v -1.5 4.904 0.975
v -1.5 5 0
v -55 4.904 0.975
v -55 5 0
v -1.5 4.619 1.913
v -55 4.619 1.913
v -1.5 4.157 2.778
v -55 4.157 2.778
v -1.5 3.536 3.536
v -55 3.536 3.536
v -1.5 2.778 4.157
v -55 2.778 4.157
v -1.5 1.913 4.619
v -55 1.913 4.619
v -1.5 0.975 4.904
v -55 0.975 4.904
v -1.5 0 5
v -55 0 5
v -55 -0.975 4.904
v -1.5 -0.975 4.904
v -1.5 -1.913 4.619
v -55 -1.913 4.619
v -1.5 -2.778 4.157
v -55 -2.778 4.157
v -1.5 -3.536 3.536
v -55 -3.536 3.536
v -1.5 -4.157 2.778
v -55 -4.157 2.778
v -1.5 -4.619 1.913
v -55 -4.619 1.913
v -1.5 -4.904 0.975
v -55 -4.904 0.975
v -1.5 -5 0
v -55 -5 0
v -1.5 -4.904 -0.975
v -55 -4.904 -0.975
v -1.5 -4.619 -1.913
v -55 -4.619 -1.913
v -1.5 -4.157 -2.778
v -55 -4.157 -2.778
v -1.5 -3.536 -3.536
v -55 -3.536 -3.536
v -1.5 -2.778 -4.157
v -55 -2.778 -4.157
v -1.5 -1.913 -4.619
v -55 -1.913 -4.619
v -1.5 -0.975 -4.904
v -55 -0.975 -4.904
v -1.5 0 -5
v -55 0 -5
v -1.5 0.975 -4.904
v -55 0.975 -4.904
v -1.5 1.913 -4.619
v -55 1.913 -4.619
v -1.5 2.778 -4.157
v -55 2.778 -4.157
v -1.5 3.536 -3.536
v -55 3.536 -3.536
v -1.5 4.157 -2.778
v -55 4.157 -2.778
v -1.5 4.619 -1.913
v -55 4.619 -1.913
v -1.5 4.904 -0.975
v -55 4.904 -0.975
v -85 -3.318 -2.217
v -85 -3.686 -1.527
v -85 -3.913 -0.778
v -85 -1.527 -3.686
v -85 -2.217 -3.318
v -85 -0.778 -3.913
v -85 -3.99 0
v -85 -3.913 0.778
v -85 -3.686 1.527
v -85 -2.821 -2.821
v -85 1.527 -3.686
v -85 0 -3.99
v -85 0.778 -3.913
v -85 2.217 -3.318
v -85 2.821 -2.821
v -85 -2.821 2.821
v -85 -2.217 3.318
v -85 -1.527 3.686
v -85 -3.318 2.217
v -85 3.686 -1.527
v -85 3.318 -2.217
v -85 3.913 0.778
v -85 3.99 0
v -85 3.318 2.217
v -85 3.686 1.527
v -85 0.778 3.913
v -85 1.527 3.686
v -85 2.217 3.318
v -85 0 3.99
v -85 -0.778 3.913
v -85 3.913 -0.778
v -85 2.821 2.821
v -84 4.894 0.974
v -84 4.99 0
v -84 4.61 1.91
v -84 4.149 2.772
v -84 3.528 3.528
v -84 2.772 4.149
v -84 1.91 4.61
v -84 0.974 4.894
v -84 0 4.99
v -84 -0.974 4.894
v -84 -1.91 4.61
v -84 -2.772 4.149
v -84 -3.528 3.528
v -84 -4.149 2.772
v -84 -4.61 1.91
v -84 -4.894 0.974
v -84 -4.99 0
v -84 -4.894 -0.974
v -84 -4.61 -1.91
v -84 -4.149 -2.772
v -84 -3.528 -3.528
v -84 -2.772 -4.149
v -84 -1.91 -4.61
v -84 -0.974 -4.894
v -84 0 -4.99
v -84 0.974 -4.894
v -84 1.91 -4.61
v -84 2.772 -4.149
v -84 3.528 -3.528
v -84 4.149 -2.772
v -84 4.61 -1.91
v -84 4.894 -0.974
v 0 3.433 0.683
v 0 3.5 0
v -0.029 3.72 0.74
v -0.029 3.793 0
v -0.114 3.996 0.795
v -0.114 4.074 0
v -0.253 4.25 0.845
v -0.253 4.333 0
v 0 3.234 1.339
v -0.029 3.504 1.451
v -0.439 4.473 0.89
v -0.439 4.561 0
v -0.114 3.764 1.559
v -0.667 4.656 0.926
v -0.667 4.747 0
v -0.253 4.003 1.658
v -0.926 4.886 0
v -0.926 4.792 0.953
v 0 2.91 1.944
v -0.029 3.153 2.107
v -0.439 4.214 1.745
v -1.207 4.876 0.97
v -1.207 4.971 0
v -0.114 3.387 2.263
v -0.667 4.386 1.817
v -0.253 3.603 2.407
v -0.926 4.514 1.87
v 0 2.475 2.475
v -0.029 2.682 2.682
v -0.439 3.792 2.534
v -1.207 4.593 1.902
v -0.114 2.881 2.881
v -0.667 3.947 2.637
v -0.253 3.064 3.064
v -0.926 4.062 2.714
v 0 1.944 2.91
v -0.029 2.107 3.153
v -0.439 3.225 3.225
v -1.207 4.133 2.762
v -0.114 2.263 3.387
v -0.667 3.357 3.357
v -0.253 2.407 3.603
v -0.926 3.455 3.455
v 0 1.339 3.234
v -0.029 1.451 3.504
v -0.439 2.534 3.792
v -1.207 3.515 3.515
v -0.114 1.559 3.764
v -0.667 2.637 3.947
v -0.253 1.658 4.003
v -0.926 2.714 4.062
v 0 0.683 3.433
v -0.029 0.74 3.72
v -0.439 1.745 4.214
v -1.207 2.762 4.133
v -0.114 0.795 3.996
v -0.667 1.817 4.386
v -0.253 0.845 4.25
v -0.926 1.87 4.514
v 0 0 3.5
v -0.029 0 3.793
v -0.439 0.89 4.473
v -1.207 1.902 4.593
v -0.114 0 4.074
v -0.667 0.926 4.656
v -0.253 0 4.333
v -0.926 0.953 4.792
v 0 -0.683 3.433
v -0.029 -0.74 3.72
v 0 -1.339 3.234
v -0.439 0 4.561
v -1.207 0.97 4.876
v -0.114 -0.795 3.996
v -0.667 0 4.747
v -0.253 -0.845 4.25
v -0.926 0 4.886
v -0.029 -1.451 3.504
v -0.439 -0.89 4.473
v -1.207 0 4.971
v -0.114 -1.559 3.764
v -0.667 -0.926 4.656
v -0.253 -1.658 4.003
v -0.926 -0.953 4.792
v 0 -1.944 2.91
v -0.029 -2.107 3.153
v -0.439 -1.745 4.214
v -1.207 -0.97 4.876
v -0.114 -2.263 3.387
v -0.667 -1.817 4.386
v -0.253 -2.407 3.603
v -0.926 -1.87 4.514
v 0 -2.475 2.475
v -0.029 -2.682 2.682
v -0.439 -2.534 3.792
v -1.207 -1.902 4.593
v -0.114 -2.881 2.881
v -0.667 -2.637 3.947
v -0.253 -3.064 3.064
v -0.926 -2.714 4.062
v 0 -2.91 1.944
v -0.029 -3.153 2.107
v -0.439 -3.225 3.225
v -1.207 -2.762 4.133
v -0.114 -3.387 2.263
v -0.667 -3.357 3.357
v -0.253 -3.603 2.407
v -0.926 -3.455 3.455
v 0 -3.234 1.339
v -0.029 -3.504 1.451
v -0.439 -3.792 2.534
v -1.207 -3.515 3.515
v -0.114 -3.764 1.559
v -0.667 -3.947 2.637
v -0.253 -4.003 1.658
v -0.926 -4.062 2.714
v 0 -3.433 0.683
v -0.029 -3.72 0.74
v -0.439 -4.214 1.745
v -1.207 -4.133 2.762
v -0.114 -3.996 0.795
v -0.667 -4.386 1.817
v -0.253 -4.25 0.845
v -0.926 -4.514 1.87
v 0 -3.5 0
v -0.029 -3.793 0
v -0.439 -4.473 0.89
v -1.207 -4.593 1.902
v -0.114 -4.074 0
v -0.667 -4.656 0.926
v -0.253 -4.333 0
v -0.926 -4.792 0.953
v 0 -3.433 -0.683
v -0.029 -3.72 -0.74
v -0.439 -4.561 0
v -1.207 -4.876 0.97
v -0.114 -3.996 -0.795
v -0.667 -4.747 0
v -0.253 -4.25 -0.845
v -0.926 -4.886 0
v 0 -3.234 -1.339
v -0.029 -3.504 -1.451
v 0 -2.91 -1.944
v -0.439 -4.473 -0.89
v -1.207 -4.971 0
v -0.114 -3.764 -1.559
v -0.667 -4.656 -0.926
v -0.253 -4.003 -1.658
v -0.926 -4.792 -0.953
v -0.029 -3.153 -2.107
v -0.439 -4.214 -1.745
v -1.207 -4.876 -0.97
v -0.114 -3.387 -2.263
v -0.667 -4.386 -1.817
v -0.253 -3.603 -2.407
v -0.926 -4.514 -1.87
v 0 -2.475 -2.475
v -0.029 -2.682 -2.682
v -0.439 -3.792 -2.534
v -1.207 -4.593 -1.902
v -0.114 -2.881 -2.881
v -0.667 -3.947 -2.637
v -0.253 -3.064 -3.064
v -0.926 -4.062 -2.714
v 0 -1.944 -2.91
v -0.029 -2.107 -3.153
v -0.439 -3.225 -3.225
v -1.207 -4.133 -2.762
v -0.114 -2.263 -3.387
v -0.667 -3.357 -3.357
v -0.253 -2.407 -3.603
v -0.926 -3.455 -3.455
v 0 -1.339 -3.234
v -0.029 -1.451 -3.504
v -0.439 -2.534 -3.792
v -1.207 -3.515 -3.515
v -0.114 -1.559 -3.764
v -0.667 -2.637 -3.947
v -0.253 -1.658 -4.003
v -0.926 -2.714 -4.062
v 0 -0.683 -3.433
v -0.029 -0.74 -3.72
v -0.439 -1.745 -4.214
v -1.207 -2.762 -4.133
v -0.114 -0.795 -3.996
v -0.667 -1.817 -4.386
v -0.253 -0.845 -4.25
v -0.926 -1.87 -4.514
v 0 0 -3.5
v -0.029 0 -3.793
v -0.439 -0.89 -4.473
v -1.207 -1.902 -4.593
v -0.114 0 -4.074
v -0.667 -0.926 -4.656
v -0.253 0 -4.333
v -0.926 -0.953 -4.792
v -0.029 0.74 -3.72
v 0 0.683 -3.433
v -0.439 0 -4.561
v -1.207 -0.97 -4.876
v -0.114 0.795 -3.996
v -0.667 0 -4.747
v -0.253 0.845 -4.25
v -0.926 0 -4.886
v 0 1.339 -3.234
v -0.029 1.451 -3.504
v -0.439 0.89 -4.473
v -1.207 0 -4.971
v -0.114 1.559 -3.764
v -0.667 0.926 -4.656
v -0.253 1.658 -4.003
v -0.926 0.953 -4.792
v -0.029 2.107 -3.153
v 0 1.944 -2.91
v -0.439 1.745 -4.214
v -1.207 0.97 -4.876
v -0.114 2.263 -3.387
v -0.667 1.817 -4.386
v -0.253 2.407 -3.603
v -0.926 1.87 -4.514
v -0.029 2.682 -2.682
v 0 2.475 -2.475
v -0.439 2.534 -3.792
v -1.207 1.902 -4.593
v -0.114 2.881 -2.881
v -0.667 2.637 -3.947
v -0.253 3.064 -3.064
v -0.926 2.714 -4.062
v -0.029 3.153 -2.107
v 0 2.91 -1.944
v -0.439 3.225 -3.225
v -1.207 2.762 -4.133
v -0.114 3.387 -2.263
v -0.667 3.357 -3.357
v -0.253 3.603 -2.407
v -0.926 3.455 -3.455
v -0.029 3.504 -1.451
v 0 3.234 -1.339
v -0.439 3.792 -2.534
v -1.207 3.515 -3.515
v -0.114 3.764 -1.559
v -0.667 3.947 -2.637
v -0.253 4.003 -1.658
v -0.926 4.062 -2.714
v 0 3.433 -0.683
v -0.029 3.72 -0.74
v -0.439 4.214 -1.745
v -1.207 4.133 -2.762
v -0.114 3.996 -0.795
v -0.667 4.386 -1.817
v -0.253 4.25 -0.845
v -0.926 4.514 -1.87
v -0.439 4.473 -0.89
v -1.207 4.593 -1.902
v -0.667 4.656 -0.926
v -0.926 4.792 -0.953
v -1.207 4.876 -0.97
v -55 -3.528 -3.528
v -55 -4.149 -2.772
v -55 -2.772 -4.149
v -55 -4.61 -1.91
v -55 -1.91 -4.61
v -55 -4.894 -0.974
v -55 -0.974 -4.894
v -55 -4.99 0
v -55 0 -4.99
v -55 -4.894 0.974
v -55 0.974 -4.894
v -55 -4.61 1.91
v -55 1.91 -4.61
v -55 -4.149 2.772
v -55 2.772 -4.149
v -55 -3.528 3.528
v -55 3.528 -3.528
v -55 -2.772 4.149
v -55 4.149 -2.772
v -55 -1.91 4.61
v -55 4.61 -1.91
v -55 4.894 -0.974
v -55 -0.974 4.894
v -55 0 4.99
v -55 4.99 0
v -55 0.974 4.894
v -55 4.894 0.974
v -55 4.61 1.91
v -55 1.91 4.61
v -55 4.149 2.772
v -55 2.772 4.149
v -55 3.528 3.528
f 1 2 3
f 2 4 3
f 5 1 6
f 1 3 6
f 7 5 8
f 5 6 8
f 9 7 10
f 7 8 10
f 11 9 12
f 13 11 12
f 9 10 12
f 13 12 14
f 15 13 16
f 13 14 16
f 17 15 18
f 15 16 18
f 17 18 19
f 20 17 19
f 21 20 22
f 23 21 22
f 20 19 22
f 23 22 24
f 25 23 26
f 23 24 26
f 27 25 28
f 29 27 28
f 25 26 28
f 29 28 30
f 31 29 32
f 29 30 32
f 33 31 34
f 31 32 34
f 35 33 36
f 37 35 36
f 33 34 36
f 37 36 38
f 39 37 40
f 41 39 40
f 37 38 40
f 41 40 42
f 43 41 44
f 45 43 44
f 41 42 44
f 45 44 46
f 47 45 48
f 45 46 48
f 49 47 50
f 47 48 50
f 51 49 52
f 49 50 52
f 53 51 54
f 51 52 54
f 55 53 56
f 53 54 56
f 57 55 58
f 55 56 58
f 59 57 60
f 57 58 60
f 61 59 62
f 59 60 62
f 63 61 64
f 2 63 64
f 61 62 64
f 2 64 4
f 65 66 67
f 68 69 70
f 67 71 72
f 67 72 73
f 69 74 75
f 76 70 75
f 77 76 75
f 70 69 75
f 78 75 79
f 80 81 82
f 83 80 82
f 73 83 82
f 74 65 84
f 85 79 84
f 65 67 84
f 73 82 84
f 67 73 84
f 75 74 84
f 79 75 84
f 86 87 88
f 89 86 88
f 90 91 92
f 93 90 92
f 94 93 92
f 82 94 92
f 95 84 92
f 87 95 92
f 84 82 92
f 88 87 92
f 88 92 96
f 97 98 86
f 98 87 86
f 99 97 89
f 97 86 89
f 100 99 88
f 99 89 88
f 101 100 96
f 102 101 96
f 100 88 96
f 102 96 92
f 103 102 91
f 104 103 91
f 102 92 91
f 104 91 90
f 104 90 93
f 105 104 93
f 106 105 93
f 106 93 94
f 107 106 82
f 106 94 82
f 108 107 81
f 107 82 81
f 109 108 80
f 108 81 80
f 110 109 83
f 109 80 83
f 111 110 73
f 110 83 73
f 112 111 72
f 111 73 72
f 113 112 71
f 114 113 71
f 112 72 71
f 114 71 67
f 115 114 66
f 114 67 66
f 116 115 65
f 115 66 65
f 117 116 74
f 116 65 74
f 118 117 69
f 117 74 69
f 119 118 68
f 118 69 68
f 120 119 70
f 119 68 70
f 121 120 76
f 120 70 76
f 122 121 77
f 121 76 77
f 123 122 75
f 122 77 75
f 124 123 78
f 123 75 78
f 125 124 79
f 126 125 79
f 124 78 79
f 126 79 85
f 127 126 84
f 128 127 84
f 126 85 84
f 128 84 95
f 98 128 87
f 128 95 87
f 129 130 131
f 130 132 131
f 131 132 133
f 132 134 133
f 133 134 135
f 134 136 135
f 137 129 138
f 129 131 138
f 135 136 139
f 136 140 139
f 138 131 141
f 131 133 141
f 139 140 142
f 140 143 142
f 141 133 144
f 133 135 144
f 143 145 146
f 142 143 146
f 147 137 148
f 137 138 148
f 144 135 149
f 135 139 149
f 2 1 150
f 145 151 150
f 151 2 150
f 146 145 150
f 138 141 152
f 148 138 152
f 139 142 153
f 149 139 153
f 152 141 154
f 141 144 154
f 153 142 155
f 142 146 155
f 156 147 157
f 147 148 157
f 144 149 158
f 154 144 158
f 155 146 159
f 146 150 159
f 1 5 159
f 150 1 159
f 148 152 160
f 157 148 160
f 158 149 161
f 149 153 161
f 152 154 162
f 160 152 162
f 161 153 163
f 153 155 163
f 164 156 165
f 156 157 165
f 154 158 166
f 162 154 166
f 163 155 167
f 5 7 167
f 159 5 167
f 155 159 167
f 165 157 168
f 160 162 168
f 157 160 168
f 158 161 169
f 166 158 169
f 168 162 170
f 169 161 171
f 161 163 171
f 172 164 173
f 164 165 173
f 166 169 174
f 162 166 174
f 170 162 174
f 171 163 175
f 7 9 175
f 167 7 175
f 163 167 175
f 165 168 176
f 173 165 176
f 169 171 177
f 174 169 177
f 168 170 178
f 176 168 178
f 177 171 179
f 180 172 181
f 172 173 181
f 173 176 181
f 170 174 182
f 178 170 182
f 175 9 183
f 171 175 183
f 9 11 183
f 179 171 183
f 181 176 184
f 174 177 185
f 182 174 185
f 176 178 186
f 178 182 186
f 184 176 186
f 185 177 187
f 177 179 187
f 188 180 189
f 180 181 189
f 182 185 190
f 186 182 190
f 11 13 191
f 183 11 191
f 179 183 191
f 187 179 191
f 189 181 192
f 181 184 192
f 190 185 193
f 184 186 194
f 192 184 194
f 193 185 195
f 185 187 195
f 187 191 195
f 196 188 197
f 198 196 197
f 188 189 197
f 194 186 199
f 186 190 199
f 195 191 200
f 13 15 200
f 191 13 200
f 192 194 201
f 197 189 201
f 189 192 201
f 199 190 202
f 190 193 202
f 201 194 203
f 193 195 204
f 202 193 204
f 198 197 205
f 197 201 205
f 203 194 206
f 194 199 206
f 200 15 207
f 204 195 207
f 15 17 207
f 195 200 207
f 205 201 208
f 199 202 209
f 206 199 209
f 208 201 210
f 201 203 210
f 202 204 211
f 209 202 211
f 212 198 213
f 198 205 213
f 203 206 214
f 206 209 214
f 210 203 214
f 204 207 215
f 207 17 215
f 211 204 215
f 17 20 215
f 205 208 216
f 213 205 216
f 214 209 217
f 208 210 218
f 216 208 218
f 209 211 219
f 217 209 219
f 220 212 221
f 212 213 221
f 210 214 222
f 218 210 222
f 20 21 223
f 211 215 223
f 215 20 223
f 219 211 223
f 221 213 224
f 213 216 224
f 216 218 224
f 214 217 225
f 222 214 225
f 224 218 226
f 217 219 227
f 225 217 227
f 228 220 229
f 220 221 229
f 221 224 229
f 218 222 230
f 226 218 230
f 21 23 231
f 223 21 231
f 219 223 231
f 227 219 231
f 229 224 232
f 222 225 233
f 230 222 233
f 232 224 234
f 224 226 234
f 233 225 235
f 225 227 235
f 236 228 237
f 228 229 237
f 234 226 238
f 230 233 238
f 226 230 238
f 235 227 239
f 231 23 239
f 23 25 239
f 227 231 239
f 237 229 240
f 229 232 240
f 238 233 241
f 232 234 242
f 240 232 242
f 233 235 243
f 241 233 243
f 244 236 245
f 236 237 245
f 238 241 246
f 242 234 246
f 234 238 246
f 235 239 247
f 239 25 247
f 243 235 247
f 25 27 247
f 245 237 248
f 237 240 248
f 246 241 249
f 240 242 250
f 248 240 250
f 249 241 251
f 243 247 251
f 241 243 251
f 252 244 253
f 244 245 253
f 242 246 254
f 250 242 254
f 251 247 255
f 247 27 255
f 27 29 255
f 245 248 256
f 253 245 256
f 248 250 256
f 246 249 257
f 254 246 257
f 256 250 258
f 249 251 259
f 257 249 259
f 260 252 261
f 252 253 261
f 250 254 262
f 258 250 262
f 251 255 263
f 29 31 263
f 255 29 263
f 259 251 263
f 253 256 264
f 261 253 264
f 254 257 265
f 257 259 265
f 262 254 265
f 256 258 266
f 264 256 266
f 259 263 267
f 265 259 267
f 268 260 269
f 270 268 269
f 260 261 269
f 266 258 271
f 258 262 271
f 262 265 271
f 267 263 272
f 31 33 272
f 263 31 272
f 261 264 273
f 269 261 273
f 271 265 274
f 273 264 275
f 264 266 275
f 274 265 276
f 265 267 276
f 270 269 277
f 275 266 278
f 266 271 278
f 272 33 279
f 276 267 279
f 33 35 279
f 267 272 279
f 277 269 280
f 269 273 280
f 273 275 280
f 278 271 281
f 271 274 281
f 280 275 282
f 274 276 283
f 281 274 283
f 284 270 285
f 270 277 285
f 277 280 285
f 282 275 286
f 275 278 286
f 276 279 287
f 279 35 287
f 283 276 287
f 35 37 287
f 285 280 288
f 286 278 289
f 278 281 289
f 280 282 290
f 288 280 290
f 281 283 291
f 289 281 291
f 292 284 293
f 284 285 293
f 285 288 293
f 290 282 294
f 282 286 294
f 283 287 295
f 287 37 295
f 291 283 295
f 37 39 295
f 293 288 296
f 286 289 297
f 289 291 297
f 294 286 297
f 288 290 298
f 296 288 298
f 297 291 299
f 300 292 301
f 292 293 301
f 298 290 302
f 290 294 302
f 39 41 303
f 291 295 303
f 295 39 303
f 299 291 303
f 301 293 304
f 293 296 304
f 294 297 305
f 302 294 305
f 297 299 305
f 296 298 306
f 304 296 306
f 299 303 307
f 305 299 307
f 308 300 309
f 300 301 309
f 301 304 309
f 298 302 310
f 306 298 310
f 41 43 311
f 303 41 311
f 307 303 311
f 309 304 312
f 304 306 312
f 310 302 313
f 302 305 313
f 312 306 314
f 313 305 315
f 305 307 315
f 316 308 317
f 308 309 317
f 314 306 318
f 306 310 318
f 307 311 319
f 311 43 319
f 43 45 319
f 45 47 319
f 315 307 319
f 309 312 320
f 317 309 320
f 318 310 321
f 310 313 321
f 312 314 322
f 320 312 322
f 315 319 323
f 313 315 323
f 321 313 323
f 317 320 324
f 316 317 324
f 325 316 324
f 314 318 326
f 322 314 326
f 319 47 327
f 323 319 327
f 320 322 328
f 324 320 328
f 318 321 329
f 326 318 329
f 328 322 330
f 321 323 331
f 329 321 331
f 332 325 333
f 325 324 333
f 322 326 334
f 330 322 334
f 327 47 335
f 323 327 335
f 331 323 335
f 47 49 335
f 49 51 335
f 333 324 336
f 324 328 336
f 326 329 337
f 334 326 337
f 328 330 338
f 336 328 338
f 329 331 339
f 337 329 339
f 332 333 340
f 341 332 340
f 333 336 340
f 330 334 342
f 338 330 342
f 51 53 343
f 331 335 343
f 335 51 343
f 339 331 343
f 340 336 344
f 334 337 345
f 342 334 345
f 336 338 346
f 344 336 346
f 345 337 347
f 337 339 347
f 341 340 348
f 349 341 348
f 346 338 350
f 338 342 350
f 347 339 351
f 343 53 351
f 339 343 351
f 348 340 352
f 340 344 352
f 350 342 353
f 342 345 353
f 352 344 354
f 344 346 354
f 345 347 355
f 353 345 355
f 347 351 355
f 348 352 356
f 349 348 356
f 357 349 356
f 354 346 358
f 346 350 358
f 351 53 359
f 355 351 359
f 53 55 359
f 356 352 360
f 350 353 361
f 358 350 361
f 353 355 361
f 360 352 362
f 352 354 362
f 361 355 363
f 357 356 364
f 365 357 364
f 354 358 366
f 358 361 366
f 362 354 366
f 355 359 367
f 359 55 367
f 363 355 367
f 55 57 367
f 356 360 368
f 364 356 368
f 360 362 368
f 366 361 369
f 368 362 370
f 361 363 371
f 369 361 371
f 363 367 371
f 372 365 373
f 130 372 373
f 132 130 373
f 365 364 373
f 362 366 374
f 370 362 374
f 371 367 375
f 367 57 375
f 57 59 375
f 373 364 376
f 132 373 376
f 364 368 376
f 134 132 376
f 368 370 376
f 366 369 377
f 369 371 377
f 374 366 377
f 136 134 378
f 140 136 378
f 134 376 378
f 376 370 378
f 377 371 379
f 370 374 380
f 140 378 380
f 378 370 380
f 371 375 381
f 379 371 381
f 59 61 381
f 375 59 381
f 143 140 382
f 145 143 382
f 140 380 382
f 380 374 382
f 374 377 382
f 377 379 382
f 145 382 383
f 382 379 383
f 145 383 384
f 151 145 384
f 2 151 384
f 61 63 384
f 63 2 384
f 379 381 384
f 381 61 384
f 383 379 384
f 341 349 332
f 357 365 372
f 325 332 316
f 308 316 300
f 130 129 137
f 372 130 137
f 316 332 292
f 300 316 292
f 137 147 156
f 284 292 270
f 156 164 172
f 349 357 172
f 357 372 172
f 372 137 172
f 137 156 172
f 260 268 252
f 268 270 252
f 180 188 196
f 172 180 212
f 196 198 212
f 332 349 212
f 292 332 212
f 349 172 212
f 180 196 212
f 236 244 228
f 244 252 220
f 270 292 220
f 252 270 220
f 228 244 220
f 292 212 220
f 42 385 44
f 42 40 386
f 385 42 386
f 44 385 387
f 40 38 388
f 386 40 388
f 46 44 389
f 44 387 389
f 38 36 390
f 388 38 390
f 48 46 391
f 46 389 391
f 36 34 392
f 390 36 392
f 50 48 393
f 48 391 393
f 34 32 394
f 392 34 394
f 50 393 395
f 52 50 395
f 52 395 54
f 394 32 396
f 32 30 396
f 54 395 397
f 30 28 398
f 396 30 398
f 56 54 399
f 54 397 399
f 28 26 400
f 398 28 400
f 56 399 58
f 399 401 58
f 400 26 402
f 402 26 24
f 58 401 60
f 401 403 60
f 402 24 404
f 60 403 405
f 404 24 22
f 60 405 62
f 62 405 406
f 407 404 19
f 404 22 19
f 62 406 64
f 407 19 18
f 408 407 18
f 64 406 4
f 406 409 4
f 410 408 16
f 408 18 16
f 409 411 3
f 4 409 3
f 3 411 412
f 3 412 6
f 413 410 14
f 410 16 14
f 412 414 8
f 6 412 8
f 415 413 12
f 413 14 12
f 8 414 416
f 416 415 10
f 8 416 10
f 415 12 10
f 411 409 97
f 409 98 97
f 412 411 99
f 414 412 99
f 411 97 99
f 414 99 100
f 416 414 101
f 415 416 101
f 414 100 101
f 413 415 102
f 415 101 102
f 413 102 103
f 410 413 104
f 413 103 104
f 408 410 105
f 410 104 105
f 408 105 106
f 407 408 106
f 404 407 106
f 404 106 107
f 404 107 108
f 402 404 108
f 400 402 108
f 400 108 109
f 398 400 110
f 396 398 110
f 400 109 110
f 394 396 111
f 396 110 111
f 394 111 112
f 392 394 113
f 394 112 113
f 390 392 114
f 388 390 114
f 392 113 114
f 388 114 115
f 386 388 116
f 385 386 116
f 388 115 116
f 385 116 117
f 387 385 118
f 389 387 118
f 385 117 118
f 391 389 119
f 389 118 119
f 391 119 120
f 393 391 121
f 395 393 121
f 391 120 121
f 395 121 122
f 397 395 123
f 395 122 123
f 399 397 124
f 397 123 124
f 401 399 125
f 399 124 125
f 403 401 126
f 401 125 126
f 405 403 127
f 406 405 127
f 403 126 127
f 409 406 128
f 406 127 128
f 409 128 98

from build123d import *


with BuildPart() as part:
    # Esquisse1 → Révolution1 (revolve)
    with BuildSketch(Plane.XY):
        with BuildLine():
            Line((0, 0), (0, 3.5))
            ThreePointArc((0, 3.5), (-0.439339828, 4.560660172), (-1.5, 5))
            Line((-1.5, 5), (-55, 5))
            Line((-55, 5), (-55, 4.99))
            Line((-55, 4.99), (-84, 4.99))
            Line((-84, 4.99), (-85, 3.99))
            Line((-85, 3.99), (-85, 0))
            Line((-85, 0), (0, 0))
        make_face()
    revolve(axis=Axis((-85, 0, 0), (1, 0, 0)))


solid = part.part
